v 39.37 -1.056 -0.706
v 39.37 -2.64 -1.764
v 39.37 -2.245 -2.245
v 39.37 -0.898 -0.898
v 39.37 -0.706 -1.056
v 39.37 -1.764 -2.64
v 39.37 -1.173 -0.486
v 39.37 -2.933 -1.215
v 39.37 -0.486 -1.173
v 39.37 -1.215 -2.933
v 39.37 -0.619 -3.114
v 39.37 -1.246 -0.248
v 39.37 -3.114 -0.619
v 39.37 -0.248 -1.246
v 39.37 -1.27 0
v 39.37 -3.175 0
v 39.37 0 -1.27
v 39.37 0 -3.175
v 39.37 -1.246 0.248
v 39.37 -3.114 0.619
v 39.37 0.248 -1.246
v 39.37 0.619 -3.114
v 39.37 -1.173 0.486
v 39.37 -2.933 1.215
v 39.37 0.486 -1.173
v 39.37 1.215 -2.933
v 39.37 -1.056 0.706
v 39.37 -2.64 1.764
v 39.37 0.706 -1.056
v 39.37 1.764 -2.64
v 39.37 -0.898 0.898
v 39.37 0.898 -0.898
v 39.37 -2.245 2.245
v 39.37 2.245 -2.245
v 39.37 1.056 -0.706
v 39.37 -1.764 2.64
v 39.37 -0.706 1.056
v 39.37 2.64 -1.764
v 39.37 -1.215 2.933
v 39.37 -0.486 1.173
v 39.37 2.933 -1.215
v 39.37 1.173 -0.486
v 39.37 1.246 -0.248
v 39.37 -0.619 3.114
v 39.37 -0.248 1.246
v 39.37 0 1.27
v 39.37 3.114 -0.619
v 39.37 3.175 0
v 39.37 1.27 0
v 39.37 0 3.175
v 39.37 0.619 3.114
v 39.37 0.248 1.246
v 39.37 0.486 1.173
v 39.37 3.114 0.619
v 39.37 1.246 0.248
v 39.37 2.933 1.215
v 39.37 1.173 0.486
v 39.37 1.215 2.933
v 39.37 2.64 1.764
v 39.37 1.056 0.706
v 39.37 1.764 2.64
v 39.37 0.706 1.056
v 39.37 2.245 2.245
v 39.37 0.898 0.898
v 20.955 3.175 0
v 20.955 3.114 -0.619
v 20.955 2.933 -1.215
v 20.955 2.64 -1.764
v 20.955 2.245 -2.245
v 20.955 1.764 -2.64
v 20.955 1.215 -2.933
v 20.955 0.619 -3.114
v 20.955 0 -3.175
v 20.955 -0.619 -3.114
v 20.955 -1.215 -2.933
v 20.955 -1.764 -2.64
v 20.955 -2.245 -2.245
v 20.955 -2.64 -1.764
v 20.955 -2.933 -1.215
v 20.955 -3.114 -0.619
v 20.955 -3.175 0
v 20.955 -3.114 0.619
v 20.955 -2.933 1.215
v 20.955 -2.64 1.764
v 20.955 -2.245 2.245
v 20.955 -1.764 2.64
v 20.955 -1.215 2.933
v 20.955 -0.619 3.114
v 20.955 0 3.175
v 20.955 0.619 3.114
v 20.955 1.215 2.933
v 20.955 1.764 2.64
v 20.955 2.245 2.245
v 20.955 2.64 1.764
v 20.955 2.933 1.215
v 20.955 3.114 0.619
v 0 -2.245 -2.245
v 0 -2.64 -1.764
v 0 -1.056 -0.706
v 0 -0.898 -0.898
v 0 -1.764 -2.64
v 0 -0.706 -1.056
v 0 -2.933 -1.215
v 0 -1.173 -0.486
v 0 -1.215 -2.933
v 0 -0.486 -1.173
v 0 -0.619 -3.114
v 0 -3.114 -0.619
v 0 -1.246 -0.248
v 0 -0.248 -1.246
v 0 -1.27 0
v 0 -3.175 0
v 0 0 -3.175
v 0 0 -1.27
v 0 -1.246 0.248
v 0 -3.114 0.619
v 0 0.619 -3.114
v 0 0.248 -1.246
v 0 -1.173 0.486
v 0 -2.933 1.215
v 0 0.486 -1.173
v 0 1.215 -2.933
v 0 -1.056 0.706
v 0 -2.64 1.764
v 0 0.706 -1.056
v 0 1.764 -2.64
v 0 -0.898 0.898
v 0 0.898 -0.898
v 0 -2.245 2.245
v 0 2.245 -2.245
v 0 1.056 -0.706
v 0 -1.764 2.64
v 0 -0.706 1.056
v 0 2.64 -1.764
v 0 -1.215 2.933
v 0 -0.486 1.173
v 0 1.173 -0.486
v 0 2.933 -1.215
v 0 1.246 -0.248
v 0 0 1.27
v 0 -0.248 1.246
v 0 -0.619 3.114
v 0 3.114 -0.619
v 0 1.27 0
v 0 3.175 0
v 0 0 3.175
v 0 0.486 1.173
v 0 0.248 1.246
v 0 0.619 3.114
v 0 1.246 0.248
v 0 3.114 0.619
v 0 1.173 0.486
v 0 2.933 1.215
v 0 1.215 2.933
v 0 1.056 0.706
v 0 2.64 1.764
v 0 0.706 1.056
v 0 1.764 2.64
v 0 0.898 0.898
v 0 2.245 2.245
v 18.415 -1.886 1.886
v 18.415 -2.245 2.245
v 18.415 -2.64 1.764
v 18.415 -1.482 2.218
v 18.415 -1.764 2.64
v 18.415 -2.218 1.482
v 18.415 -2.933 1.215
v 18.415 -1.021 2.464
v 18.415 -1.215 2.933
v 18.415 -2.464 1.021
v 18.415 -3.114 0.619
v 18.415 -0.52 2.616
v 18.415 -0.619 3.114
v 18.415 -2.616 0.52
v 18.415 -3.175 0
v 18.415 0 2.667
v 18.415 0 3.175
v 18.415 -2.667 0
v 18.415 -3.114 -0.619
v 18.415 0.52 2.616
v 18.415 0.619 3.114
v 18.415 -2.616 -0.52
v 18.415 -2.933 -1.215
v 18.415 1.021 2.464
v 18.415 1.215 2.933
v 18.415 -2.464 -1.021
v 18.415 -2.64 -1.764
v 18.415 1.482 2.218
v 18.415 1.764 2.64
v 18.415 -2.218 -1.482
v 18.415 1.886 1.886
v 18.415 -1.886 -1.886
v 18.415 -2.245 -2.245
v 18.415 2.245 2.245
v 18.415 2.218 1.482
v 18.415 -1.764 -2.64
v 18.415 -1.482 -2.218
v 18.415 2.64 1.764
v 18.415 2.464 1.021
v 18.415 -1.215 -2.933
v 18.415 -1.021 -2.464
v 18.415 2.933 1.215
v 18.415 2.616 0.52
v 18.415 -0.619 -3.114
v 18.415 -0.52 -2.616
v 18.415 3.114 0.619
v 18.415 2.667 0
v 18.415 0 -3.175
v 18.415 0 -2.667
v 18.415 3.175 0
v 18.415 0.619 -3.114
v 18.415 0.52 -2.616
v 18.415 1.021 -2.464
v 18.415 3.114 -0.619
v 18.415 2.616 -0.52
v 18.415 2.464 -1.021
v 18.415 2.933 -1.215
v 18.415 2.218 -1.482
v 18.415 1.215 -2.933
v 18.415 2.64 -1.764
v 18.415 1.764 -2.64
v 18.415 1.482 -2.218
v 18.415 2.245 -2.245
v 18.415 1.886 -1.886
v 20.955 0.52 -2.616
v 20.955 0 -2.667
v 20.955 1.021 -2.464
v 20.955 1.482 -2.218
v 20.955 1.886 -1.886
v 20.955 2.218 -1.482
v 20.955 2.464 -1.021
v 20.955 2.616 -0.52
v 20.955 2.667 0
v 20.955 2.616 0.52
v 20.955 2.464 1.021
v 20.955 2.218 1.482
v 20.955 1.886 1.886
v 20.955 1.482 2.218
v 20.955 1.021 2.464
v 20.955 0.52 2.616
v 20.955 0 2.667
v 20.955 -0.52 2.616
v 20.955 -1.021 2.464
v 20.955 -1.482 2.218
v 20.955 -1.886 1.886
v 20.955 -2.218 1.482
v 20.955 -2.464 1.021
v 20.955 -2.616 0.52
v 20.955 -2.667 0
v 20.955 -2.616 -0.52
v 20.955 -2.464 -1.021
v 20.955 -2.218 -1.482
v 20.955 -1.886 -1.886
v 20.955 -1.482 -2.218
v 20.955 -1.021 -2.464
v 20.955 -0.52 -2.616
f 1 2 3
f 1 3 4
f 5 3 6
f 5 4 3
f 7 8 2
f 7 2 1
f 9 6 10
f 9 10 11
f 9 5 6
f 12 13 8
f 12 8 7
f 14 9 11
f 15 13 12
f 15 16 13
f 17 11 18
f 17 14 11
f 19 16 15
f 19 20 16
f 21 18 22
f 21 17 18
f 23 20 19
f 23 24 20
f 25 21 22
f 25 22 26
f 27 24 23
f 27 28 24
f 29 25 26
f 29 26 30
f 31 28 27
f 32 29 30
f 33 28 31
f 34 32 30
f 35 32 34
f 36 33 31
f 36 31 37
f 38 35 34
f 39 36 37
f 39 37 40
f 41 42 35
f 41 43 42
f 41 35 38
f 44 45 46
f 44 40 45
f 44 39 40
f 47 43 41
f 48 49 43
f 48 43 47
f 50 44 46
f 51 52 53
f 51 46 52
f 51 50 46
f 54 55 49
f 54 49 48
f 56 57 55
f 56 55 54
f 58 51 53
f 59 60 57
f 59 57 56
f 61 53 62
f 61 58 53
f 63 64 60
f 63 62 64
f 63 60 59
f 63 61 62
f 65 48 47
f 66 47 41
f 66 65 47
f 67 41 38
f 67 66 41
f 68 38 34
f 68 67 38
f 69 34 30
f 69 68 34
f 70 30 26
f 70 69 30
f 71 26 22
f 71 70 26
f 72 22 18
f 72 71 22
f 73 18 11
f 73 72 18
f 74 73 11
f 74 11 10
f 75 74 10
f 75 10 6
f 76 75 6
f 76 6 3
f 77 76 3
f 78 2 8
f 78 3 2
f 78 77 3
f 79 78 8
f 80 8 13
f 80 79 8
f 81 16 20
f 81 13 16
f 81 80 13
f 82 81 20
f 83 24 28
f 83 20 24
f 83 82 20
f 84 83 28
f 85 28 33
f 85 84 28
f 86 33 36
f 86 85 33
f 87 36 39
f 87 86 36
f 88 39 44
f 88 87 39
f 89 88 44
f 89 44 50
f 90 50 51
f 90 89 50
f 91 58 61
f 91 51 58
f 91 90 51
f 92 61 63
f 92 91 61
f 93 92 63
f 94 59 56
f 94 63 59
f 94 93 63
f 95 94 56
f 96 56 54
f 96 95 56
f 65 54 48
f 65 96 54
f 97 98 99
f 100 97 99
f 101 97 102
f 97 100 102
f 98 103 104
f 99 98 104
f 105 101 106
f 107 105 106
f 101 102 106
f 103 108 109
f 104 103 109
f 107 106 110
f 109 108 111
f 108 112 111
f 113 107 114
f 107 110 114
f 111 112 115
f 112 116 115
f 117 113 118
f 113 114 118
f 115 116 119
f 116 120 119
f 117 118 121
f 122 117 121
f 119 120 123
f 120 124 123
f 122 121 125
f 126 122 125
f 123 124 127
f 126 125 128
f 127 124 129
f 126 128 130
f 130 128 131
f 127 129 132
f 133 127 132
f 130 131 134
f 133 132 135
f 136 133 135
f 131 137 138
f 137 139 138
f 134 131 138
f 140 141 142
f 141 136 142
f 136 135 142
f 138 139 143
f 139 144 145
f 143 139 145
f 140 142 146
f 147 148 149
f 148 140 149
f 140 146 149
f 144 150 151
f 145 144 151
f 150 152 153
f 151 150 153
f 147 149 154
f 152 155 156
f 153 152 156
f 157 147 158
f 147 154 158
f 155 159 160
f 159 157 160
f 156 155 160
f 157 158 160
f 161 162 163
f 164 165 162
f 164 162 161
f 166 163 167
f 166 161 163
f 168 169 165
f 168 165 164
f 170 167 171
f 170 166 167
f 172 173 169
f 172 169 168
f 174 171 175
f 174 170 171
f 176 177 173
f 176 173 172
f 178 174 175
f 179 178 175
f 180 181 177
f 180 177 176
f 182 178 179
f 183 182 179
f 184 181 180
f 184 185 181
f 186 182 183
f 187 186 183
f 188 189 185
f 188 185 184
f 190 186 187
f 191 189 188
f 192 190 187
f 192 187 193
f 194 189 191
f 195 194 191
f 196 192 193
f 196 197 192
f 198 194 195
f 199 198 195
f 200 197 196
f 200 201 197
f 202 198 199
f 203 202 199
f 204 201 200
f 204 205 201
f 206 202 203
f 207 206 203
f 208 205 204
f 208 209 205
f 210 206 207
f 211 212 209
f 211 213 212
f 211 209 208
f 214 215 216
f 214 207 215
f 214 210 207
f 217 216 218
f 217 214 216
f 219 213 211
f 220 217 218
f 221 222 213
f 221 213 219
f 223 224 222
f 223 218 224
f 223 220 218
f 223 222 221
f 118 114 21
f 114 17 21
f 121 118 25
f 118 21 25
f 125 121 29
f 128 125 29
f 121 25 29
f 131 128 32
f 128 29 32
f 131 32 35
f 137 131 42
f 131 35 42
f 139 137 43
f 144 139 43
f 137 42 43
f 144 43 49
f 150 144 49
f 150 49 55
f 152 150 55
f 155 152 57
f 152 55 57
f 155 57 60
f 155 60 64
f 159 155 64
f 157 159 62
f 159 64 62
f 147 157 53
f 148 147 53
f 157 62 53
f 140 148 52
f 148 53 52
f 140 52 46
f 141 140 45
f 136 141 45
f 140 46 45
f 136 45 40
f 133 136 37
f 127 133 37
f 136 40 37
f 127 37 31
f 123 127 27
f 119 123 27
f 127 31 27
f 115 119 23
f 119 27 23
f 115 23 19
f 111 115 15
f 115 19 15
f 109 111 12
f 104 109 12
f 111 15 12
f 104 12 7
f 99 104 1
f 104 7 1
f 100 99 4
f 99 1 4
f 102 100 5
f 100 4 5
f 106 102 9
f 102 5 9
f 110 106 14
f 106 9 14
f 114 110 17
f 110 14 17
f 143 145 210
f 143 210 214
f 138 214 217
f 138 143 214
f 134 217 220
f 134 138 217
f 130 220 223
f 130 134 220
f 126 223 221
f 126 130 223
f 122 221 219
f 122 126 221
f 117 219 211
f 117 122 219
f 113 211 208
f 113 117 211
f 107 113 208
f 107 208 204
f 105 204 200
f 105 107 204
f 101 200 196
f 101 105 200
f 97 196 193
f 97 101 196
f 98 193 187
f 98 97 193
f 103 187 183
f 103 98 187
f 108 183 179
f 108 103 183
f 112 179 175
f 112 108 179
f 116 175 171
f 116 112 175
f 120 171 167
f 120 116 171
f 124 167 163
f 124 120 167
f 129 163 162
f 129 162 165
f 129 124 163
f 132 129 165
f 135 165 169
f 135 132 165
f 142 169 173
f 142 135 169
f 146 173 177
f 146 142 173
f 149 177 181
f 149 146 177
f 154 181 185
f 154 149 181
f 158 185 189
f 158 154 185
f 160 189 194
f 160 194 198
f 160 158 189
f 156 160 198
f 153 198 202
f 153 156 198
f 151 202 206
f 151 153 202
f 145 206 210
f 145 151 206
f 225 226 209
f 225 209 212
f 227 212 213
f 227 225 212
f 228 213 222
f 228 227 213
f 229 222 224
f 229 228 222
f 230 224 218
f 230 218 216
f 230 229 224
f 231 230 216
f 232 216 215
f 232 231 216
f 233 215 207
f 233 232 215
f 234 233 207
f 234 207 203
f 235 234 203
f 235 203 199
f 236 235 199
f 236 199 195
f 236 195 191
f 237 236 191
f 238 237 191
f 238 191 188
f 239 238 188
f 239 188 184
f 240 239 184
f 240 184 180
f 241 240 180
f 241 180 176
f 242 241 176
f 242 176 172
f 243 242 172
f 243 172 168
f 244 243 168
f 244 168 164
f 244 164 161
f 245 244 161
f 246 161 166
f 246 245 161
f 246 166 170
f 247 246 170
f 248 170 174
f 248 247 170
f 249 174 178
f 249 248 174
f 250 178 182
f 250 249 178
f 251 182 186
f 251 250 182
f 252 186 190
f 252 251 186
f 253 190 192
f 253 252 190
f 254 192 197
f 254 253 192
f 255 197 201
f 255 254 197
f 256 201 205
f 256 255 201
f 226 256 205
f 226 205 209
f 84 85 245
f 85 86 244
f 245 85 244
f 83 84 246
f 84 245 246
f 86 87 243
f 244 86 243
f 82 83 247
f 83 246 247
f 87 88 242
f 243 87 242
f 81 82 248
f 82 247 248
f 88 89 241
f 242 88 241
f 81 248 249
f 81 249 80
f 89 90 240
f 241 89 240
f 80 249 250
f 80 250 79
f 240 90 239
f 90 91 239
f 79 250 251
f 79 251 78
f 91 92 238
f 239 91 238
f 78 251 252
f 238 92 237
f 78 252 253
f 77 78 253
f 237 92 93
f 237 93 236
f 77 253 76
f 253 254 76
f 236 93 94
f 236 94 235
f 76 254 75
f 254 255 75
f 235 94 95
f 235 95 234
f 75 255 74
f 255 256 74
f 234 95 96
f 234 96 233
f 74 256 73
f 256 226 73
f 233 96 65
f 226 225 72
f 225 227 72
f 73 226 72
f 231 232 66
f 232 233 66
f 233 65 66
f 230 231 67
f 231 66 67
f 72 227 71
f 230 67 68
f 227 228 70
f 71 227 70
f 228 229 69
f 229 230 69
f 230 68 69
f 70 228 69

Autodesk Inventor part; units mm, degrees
ref_plane "YZ Plane" through (0, 0, 0) normal (1, 0, 0) x (0, 1, 0)
ref_plane "XZ Plane" through (0, 0, 0) normal (0, 1, 0) x (-1, 0, 0)
ref_plane "XY Plane" through (0, 0, 0) normal (0, 0, 1) x (1, 0, 0)
sketch "Sketch1" plane through (0, 0, 0) normal (1, 0, 0) x (0, 1, 0)
  circle A0 centre (0, 0) radius 3.175
  dimension "d0" = 6.35
extrude "Extrusion1" add sketch "Sketch1" along normal blind 39.37
sketch "Sketch2" plane through (39.37, 0, 0) normal (1, 0, 0) x (0, 0, -1)
  circle A0 centre (0, 0) radius 1.27
  dimension "d3" = 2.54
extrude "Extrusion2" cut sketch "Sketch2" against normal blind 39.37
thread "Thread1" size "4-40 UNC" class "2B" standard "ANSI Unified Screw Threads" full length
sketch "Sketch5" plane through (0, 0, 0) normal (0, 1, 0) x (-1, 0, 0)
  line L0 (0, 0) -> (-39.37, 0)
  line L1 (-39.37, 3.175) -> (-39.37, -3.175) projected
  line L2 (0, -3.175) -> (-39.37, -3.175) projected
  line L3 (-19.685, -3.175) -> (-18.415, -3.175)
  line L4 (-18.415, -3.175) -> (-18.415, -2.667)
  line L5 (-18.415, -2.667) -> (-20.955, -2.667)
  line L6 (-20.955, -2.667) -> (-20.955, -3.175)
  line L7 (-20.955, -3.175) -> (-19.685, -3.175)
  dimension "d11" = 1.27
  dimension "d12" = 0.508
  dimension "d13" = 2.54
revolve "Revolution1" cut sketch "Sketch5" angle 360 about axis through (0, 0, 0) along (1, 0, 0)
properties part number "clawholder"
